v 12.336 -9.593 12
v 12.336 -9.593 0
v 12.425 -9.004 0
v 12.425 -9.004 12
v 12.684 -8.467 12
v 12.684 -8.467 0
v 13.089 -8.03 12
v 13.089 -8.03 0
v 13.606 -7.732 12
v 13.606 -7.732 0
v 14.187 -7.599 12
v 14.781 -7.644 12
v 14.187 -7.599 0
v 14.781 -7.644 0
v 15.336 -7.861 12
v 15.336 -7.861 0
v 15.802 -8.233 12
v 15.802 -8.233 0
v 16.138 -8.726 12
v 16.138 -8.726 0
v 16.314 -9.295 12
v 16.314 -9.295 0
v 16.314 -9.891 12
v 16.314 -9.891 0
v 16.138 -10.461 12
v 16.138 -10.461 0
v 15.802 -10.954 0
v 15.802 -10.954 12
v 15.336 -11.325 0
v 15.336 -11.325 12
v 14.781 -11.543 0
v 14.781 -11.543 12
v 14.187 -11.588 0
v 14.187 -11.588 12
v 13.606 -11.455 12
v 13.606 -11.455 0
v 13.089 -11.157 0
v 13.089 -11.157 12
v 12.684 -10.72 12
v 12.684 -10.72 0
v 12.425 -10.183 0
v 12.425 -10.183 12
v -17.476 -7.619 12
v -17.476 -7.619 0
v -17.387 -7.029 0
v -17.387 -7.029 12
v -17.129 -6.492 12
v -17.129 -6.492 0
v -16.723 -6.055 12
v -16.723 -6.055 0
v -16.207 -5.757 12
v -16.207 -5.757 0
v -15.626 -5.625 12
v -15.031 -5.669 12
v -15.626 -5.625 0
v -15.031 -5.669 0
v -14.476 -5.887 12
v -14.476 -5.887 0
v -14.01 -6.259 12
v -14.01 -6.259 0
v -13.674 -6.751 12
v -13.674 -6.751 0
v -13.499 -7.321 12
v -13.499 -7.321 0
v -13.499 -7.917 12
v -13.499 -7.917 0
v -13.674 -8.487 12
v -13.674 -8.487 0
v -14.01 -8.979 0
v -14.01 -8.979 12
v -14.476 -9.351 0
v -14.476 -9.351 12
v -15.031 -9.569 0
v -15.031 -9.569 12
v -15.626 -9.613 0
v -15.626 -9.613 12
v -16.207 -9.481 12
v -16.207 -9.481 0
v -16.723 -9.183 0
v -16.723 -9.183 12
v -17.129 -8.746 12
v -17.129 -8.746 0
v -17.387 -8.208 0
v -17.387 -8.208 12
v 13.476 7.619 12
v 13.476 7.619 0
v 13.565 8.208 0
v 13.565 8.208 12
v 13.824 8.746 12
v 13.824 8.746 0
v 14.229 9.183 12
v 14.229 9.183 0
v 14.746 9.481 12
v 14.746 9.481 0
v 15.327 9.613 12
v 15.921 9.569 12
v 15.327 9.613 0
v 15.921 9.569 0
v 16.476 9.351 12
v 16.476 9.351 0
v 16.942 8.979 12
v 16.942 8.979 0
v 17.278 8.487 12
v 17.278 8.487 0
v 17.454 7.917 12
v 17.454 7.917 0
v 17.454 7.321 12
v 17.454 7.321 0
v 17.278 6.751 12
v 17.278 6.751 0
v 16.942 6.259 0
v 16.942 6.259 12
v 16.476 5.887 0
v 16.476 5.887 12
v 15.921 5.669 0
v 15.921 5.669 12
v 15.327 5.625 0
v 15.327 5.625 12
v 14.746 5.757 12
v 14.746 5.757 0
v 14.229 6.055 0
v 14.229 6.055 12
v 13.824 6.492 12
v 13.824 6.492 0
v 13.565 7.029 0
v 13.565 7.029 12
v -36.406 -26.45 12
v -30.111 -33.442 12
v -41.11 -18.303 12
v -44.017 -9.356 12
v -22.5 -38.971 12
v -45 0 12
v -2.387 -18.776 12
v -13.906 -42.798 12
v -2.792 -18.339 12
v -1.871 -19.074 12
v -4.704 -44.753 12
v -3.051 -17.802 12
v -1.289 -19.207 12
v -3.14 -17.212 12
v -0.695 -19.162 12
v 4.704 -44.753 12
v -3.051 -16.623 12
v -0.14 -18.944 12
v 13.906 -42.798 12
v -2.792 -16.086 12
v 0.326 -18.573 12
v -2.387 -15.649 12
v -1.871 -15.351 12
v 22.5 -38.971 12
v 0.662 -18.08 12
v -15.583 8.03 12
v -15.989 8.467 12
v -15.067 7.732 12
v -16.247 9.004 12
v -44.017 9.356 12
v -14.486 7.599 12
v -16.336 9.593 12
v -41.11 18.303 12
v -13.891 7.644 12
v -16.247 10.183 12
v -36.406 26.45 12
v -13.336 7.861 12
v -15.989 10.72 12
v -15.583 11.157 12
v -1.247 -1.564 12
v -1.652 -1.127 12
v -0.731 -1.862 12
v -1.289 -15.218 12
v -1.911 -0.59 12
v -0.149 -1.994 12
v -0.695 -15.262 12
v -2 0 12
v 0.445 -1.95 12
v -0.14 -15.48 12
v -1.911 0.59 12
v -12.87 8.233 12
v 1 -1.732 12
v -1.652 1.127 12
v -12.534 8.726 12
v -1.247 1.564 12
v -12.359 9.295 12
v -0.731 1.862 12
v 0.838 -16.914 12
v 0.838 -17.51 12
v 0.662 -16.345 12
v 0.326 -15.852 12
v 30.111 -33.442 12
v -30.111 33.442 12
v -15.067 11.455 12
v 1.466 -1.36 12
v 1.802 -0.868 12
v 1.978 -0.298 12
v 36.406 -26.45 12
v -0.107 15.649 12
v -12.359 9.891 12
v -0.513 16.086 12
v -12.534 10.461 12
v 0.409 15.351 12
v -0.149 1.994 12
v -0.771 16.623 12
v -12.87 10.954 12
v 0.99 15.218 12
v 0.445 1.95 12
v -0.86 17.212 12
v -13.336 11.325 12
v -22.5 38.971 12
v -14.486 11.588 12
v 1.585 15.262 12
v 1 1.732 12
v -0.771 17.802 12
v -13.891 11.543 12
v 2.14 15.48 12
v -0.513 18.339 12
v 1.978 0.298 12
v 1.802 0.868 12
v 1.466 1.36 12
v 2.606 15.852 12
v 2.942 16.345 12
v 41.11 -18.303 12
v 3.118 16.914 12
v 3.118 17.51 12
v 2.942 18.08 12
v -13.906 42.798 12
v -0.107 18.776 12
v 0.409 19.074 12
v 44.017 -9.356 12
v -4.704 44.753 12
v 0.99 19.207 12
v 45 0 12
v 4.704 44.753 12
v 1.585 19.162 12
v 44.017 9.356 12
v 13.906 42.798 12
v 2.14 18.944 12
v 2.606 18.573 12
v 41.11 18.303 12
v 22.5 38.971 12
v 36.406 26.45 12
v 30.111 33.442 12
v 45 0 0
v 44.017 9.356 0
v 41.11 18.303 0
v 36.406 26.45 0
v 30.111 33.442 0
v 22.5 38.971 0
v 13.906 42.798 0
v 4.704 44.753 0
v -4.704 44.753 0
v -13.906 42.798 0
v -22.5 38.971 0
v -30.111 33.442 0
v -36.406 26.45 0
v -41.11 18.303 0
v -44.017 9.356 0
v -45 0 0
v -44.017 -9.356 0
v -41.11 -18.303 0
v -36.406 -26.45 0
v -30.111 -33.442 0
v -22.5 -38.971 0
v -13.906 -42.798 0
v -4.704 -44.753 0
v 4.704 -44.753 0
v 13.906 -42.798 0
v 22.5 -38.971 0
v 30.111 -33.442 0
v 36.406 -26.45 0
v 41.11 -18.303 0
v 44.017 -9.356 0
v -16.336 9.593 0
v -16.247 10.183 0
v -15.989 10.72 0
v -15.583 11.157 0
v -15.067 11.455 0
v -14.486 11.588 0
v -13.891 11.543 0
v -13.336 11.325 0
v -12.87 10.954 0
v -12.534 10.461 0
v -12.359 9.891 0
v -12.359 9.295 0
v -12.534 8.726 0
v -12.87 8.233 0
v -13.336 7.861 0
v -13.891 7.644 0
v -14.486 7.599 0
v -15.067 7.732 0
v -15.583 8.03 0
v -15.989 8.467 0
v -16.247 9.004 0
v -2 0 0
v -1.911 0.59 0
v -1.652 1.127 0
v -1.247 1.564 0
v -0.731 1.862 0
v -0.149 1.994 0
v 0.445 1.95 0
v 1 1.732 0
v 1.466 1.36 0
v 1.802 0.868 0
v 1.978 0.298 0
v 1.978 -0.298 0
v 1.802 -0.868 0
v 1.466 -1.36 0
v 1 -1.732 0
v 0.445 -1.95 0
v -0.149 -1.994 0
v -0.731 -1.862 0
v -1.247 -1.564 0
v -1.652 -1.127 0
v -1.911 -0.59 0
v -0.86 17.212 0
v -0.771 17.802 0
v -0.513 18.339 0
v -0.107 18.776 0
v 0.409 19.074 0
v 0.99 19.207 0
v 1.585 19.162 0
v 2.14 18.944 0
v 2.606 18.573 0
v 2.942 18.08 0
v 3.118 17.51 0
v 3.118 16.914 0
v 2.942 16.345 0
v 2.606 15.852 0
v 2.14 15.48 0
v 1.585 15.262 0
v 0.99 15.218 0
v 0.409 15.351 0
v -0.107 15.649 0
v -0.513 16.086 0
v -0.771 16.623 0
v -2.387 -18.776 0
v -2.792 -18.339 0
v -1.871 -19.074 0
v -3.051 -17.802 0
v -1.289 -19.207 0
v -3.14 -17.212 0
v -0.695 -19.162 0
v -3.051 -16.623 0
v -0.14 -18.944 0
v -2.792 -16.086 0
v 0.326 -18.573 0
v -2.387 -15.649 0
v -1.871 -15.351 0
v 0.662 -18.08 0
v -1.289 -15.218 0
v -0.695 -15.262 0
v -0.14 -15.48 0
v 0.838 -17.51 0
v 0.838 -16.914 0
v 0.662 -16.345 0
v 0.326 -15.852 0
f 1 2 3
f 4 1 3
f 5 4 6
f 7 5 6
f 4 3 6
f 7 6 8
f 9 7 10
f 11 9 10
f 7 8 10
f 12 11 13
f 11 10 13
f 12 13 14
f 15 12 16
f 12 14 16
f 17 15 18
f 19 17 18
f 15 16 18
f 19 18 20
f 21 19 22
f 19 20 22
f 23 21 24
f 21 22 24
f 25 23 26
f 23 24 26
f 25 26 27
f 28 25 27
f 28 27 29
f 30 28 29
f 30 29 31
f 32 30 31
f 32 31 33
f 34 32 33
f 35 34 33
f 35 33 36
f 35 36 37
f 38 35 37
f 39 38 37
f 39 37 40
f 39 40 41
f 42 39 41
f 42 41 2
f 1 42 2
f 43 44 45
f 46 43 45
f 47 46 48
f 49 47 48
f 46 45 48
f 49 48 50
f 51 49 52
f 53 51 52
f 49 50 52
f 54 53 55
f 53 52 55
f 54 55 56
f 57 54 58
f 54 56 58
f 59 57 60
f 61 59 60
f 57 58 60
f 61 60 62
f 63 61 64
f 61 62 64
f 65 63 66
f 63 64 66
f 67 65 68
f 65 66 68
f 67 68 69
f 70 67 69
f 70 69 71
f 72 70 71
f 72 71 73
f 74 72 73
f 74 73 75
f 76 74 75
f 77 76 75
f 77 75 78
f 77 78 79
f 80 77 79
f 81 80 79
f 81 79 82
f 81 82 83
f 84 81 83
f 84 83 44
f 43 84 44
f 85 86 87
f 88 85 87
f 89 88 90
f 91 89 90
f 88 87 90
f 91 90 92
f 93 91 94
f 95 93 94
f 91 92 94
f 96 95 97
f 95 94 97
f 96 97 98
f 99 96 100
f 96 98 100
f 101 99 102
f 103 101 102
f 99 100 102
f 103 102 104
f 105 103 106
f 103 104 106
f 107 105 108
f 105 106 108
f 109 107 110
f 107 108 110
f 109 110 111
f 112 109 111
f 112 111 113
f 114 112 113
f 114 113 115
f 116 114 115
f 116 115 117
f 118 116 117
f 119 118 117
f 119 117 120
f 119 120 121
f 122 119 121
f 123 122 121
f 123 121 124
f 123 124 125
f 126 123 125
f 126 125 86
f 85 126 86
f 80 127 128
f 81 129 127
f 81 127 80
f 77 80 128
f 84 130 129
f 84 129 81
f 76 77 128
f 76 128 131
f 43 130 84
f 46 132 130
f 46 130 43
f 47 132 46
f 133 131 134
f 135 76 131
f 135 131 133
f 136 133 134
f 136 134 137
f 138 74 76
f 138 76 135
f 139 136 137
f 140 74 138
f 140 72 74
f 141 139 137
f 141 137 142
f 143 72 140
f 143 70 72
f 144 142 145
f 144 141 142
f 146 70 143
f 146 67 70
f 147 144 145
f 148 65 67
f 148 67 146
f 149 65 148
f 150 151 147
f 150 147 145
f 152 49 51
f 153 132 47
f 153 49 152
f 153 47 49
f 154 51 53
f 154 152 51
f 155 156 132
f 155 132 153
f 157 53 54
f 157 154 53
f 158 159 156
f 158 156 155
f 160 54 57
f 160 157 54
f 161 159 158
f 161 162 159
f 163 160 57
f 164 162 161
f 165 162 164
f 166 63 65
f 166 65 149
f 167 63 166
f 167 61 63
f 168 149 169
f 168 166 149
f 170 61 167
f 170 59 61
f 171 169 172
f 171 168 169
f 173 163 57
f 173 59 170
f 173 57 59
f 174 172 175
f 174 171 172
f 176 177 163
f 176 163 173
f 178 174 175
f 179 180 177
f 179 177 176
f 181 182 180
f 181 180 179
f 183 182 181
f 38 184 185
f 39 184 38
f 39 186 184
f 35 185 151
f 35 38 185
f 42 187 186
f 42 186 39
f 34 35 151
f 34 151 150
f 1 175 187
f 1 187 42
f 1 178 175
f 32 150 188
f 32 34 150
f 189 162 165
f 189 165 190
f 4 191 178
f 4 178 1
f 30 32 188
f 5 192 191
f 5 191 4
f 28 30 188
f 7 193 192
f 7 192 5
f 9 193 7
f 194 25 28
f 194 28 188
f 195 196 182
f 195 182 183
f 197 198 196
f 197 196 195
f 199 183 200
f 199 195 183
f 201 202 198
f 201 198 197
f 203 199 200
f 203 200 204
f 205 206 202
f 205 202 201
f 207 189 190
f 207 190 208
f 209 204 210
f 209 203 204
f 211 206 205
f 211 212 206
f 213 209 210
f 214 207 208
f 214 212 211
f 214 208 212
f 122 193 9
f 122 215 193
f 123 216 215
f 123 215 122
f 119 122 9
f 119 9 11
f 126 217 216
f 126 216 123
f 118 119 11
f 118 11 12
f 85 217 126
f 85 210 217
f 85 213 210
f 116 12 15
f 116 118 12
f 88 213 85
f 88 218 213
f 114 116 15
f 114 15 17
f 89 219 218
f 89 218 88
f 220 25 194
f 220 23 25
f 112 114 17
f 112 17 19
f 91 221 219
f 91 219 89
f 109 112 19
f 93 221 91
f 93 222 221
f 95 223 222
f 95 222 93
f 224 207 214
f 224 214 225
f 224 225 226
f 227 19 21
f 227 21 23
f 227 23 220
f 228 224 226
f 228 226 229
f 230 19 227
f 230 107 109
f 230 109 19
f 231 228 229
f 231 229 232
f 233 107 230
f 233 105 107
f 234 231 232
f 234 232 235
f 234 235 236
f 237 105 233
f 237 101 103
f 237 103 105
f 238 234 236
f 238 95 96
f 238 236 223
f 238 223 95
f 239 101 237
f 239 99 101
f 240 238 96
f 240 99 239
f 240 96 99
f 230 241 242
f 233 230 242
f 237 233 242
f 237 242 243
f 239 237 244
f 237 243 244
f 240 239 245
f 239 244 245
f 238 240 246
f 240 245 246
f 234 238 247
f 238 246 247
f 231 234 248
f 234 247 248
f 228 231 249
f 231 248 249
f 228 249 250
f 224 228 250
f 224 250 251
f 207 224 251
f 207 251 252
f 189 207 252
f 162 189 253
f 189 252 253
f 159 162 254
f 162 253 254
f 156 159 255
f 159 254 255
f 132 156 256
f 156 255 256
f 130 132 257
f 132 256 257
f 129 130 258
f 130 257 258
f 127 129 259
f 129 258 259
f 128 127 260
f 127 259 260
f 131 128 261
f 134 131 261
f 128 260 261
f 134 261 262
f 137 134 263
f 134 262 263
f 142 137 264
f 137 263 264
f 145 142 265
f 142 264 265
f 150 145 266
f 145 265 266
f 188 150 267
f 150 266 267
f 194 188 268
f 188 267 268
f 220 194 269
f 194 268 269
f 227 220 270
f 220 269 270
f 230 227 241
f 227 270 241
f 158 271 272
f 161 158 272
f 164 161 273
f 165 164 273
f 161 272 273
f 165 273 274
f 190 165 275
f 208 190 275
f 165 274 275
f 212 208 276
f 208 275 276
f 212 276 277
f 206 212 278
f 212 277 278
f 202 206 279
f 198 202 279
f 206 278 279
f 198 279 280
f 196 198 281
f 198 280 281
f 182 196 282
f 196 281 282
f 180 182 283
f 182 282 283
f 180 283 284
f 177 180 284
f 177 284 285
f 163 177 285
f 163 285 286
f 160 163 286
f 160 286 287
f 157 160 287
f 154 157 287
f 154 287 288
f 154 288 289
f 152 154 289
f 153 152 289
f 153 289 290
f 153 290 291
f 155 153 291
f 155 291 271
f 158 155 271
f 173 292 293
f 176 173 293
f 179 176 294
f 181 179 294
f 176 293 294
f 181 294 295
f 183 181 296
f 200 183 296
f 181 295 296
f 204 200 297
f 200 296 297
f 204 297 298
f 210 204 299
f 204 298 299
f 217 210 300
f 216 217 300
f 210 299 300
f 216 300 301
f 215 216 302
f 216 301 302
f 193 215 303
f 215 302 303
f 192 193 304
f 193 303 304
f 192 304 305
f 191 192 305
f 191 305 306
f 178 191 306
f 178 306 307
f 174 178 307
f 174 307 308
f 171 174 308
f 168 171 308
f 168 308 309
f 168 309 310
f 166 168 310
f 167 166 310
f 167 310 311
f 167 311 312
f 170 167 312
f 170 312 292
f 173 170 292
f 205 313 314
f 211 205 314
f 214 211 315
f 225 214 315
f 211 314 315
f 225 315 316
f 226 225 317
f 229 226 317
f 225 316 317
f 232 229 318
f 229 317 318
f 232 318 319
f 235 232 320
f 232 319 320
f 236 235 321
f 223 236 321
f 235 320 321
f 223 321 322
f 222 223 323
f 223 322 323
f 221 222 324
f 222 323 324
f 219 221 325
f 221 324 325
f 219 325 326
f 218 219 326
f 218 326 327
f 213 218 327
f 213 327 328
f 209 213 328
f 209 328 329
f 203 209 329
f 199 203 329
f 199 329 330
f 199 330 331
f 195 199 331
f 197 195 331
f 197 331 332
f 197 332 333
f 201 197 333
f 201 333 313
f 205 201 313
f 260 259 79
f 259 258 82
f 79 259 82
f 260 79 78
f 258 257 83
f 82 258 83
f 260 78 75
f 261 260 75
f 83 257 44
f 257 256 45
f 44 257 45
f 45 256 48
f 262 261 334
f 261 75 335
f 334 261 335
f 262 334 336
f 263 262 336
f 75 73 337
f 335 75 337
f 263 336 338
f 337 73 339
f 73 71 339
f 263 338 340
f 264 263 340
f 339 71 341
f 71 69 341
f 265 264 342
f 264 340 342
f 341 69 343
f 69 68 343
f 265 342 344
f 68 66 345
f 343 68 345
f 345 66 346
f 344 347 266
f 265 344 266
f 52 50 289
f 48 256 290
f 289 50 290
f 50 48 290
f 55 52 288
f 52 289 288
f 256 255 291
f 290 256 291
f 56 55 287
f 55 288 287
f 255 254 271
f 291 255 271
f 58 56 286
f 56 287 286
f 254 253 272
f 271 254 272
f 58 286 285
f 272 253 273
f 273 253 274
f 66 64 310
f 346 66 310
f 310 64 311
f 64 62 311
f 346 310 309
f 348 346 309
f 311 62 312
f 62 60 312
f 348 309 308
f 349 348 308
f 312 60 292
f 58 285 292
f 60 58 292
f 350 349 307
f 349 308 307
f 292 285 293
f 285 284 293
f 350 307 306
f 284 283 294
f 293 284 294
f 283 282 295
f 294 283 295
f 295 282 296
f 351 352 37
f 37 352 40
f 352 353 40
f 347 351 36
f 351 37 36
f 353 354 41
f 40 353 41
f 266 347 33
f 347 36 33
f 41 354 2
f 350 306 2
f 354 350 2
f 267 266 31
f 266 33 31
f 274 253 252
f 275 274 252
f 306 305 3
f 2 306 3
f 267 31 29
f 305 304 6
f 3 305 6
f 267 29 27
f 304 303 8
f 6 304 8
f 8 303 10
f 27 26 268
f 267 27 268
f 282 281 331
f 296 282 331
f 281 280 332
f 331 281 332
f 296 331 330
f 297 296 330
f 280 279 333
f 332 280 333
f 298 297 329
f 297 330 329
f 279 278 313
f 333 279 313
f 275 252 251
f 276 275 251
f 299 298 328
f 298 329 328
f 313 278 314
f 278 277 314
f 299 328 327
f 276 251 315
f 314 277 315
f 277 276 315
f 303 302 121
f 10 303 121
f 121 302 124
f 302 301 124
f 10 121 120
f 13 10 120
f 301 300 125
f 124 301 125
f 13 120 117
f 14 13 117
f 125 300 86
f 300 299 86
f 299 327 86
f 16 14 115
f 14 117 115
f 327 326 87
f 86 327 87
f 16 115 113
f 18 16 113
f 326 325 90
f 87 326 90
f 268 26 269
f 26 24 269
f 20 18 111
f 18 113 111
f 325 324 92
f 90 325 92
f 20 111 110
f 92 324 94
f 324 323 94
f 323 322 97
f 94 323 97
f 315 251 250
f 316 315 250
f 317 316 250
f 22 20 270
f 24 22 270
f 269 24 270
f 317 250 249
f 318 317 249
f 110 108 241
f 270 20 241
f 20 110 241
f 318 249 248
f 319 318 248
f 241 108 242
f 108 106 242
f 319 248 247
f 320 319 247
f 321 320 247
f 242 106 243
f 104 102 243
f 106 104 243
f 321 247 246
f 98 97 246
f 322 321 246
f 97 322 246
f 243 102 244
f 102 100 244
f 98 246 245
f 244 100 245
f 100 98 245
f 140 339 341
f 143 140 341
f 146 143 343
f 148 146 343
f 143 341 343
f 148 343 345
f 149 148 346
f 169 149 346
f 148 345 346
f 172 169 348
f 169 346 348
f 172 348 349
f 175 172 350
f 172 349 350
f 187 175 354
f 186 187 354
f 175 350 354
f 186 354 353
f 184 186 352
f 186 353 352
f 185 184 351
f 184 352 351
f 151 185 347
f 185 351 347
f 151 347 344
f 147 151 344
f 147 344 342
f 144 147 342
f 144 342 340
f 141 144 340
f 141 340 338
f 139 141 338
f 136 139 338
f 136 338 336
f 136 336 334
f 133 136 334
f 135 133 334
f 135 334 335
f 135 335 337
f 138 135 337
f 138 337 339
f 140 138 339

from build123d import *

# Parameters (mm, degrees)
SKETCH_1_R          = 45
EXTRUDE_1_DEPTH     = 12
SKETCH_5_R          = 2
CUT_EXTRUDE_1_DEPTH = 20
SKETCH_6_R          = 2
CUT_EXTRUDE_2_DEPTH = 21


with BuildPart() as part:
    # 草图1 → 凸台-拉伸1 (new body)
    with BuildSketch(Plane.XY):
        Circle(SKETCH_1_R)
    extrude(amount=EXTRUDE_1_DEPTH)

    # 草图5 → 切除-拉伸1 (cut)
    with BuildSketch(Plane(origin=(0, 0, 0), x_dir=(-1, 0, 0), z_dir=(0, 0, -1))):
        with Locations((-15.476254719, 7.618926425)):
            Circle(SKETCH_5_R)
        with Locations((-1.139943526, 17.212292955)):
            Circle(SKETCH_5_R)
        with Locations((14.336311193, 9.59336653)):
            Circle(SKETCH_5_R)
        with Locations((15.476254719, -7.618926425)):
            Circle(SKETCH_5_R)
        with Locations((1.139943526, -17.212292955)):
            Circle(SKETCH_5_R)
        with Locations((-14.336311193, -9.59336653)):
            Circle(SKETCH_5_R)
    extrude(amount=-CUT_EXTRUDE_1_DEPTH, mode=Mode.SUBTRACT)

    # 草图6 → 切除-拉伸2 (cut)
    with BuildSketch(Plane(origin=(0, 0, 0), x_dir=(-1, 0, 0), z_dir=(0, 0, -1))):
        Circle(SKETCH_6_R)
    extrude(amount=-CUT_EXTRUDE_2_DEPTH, mode=Mode.SUBTRACT)


solid = part.part
